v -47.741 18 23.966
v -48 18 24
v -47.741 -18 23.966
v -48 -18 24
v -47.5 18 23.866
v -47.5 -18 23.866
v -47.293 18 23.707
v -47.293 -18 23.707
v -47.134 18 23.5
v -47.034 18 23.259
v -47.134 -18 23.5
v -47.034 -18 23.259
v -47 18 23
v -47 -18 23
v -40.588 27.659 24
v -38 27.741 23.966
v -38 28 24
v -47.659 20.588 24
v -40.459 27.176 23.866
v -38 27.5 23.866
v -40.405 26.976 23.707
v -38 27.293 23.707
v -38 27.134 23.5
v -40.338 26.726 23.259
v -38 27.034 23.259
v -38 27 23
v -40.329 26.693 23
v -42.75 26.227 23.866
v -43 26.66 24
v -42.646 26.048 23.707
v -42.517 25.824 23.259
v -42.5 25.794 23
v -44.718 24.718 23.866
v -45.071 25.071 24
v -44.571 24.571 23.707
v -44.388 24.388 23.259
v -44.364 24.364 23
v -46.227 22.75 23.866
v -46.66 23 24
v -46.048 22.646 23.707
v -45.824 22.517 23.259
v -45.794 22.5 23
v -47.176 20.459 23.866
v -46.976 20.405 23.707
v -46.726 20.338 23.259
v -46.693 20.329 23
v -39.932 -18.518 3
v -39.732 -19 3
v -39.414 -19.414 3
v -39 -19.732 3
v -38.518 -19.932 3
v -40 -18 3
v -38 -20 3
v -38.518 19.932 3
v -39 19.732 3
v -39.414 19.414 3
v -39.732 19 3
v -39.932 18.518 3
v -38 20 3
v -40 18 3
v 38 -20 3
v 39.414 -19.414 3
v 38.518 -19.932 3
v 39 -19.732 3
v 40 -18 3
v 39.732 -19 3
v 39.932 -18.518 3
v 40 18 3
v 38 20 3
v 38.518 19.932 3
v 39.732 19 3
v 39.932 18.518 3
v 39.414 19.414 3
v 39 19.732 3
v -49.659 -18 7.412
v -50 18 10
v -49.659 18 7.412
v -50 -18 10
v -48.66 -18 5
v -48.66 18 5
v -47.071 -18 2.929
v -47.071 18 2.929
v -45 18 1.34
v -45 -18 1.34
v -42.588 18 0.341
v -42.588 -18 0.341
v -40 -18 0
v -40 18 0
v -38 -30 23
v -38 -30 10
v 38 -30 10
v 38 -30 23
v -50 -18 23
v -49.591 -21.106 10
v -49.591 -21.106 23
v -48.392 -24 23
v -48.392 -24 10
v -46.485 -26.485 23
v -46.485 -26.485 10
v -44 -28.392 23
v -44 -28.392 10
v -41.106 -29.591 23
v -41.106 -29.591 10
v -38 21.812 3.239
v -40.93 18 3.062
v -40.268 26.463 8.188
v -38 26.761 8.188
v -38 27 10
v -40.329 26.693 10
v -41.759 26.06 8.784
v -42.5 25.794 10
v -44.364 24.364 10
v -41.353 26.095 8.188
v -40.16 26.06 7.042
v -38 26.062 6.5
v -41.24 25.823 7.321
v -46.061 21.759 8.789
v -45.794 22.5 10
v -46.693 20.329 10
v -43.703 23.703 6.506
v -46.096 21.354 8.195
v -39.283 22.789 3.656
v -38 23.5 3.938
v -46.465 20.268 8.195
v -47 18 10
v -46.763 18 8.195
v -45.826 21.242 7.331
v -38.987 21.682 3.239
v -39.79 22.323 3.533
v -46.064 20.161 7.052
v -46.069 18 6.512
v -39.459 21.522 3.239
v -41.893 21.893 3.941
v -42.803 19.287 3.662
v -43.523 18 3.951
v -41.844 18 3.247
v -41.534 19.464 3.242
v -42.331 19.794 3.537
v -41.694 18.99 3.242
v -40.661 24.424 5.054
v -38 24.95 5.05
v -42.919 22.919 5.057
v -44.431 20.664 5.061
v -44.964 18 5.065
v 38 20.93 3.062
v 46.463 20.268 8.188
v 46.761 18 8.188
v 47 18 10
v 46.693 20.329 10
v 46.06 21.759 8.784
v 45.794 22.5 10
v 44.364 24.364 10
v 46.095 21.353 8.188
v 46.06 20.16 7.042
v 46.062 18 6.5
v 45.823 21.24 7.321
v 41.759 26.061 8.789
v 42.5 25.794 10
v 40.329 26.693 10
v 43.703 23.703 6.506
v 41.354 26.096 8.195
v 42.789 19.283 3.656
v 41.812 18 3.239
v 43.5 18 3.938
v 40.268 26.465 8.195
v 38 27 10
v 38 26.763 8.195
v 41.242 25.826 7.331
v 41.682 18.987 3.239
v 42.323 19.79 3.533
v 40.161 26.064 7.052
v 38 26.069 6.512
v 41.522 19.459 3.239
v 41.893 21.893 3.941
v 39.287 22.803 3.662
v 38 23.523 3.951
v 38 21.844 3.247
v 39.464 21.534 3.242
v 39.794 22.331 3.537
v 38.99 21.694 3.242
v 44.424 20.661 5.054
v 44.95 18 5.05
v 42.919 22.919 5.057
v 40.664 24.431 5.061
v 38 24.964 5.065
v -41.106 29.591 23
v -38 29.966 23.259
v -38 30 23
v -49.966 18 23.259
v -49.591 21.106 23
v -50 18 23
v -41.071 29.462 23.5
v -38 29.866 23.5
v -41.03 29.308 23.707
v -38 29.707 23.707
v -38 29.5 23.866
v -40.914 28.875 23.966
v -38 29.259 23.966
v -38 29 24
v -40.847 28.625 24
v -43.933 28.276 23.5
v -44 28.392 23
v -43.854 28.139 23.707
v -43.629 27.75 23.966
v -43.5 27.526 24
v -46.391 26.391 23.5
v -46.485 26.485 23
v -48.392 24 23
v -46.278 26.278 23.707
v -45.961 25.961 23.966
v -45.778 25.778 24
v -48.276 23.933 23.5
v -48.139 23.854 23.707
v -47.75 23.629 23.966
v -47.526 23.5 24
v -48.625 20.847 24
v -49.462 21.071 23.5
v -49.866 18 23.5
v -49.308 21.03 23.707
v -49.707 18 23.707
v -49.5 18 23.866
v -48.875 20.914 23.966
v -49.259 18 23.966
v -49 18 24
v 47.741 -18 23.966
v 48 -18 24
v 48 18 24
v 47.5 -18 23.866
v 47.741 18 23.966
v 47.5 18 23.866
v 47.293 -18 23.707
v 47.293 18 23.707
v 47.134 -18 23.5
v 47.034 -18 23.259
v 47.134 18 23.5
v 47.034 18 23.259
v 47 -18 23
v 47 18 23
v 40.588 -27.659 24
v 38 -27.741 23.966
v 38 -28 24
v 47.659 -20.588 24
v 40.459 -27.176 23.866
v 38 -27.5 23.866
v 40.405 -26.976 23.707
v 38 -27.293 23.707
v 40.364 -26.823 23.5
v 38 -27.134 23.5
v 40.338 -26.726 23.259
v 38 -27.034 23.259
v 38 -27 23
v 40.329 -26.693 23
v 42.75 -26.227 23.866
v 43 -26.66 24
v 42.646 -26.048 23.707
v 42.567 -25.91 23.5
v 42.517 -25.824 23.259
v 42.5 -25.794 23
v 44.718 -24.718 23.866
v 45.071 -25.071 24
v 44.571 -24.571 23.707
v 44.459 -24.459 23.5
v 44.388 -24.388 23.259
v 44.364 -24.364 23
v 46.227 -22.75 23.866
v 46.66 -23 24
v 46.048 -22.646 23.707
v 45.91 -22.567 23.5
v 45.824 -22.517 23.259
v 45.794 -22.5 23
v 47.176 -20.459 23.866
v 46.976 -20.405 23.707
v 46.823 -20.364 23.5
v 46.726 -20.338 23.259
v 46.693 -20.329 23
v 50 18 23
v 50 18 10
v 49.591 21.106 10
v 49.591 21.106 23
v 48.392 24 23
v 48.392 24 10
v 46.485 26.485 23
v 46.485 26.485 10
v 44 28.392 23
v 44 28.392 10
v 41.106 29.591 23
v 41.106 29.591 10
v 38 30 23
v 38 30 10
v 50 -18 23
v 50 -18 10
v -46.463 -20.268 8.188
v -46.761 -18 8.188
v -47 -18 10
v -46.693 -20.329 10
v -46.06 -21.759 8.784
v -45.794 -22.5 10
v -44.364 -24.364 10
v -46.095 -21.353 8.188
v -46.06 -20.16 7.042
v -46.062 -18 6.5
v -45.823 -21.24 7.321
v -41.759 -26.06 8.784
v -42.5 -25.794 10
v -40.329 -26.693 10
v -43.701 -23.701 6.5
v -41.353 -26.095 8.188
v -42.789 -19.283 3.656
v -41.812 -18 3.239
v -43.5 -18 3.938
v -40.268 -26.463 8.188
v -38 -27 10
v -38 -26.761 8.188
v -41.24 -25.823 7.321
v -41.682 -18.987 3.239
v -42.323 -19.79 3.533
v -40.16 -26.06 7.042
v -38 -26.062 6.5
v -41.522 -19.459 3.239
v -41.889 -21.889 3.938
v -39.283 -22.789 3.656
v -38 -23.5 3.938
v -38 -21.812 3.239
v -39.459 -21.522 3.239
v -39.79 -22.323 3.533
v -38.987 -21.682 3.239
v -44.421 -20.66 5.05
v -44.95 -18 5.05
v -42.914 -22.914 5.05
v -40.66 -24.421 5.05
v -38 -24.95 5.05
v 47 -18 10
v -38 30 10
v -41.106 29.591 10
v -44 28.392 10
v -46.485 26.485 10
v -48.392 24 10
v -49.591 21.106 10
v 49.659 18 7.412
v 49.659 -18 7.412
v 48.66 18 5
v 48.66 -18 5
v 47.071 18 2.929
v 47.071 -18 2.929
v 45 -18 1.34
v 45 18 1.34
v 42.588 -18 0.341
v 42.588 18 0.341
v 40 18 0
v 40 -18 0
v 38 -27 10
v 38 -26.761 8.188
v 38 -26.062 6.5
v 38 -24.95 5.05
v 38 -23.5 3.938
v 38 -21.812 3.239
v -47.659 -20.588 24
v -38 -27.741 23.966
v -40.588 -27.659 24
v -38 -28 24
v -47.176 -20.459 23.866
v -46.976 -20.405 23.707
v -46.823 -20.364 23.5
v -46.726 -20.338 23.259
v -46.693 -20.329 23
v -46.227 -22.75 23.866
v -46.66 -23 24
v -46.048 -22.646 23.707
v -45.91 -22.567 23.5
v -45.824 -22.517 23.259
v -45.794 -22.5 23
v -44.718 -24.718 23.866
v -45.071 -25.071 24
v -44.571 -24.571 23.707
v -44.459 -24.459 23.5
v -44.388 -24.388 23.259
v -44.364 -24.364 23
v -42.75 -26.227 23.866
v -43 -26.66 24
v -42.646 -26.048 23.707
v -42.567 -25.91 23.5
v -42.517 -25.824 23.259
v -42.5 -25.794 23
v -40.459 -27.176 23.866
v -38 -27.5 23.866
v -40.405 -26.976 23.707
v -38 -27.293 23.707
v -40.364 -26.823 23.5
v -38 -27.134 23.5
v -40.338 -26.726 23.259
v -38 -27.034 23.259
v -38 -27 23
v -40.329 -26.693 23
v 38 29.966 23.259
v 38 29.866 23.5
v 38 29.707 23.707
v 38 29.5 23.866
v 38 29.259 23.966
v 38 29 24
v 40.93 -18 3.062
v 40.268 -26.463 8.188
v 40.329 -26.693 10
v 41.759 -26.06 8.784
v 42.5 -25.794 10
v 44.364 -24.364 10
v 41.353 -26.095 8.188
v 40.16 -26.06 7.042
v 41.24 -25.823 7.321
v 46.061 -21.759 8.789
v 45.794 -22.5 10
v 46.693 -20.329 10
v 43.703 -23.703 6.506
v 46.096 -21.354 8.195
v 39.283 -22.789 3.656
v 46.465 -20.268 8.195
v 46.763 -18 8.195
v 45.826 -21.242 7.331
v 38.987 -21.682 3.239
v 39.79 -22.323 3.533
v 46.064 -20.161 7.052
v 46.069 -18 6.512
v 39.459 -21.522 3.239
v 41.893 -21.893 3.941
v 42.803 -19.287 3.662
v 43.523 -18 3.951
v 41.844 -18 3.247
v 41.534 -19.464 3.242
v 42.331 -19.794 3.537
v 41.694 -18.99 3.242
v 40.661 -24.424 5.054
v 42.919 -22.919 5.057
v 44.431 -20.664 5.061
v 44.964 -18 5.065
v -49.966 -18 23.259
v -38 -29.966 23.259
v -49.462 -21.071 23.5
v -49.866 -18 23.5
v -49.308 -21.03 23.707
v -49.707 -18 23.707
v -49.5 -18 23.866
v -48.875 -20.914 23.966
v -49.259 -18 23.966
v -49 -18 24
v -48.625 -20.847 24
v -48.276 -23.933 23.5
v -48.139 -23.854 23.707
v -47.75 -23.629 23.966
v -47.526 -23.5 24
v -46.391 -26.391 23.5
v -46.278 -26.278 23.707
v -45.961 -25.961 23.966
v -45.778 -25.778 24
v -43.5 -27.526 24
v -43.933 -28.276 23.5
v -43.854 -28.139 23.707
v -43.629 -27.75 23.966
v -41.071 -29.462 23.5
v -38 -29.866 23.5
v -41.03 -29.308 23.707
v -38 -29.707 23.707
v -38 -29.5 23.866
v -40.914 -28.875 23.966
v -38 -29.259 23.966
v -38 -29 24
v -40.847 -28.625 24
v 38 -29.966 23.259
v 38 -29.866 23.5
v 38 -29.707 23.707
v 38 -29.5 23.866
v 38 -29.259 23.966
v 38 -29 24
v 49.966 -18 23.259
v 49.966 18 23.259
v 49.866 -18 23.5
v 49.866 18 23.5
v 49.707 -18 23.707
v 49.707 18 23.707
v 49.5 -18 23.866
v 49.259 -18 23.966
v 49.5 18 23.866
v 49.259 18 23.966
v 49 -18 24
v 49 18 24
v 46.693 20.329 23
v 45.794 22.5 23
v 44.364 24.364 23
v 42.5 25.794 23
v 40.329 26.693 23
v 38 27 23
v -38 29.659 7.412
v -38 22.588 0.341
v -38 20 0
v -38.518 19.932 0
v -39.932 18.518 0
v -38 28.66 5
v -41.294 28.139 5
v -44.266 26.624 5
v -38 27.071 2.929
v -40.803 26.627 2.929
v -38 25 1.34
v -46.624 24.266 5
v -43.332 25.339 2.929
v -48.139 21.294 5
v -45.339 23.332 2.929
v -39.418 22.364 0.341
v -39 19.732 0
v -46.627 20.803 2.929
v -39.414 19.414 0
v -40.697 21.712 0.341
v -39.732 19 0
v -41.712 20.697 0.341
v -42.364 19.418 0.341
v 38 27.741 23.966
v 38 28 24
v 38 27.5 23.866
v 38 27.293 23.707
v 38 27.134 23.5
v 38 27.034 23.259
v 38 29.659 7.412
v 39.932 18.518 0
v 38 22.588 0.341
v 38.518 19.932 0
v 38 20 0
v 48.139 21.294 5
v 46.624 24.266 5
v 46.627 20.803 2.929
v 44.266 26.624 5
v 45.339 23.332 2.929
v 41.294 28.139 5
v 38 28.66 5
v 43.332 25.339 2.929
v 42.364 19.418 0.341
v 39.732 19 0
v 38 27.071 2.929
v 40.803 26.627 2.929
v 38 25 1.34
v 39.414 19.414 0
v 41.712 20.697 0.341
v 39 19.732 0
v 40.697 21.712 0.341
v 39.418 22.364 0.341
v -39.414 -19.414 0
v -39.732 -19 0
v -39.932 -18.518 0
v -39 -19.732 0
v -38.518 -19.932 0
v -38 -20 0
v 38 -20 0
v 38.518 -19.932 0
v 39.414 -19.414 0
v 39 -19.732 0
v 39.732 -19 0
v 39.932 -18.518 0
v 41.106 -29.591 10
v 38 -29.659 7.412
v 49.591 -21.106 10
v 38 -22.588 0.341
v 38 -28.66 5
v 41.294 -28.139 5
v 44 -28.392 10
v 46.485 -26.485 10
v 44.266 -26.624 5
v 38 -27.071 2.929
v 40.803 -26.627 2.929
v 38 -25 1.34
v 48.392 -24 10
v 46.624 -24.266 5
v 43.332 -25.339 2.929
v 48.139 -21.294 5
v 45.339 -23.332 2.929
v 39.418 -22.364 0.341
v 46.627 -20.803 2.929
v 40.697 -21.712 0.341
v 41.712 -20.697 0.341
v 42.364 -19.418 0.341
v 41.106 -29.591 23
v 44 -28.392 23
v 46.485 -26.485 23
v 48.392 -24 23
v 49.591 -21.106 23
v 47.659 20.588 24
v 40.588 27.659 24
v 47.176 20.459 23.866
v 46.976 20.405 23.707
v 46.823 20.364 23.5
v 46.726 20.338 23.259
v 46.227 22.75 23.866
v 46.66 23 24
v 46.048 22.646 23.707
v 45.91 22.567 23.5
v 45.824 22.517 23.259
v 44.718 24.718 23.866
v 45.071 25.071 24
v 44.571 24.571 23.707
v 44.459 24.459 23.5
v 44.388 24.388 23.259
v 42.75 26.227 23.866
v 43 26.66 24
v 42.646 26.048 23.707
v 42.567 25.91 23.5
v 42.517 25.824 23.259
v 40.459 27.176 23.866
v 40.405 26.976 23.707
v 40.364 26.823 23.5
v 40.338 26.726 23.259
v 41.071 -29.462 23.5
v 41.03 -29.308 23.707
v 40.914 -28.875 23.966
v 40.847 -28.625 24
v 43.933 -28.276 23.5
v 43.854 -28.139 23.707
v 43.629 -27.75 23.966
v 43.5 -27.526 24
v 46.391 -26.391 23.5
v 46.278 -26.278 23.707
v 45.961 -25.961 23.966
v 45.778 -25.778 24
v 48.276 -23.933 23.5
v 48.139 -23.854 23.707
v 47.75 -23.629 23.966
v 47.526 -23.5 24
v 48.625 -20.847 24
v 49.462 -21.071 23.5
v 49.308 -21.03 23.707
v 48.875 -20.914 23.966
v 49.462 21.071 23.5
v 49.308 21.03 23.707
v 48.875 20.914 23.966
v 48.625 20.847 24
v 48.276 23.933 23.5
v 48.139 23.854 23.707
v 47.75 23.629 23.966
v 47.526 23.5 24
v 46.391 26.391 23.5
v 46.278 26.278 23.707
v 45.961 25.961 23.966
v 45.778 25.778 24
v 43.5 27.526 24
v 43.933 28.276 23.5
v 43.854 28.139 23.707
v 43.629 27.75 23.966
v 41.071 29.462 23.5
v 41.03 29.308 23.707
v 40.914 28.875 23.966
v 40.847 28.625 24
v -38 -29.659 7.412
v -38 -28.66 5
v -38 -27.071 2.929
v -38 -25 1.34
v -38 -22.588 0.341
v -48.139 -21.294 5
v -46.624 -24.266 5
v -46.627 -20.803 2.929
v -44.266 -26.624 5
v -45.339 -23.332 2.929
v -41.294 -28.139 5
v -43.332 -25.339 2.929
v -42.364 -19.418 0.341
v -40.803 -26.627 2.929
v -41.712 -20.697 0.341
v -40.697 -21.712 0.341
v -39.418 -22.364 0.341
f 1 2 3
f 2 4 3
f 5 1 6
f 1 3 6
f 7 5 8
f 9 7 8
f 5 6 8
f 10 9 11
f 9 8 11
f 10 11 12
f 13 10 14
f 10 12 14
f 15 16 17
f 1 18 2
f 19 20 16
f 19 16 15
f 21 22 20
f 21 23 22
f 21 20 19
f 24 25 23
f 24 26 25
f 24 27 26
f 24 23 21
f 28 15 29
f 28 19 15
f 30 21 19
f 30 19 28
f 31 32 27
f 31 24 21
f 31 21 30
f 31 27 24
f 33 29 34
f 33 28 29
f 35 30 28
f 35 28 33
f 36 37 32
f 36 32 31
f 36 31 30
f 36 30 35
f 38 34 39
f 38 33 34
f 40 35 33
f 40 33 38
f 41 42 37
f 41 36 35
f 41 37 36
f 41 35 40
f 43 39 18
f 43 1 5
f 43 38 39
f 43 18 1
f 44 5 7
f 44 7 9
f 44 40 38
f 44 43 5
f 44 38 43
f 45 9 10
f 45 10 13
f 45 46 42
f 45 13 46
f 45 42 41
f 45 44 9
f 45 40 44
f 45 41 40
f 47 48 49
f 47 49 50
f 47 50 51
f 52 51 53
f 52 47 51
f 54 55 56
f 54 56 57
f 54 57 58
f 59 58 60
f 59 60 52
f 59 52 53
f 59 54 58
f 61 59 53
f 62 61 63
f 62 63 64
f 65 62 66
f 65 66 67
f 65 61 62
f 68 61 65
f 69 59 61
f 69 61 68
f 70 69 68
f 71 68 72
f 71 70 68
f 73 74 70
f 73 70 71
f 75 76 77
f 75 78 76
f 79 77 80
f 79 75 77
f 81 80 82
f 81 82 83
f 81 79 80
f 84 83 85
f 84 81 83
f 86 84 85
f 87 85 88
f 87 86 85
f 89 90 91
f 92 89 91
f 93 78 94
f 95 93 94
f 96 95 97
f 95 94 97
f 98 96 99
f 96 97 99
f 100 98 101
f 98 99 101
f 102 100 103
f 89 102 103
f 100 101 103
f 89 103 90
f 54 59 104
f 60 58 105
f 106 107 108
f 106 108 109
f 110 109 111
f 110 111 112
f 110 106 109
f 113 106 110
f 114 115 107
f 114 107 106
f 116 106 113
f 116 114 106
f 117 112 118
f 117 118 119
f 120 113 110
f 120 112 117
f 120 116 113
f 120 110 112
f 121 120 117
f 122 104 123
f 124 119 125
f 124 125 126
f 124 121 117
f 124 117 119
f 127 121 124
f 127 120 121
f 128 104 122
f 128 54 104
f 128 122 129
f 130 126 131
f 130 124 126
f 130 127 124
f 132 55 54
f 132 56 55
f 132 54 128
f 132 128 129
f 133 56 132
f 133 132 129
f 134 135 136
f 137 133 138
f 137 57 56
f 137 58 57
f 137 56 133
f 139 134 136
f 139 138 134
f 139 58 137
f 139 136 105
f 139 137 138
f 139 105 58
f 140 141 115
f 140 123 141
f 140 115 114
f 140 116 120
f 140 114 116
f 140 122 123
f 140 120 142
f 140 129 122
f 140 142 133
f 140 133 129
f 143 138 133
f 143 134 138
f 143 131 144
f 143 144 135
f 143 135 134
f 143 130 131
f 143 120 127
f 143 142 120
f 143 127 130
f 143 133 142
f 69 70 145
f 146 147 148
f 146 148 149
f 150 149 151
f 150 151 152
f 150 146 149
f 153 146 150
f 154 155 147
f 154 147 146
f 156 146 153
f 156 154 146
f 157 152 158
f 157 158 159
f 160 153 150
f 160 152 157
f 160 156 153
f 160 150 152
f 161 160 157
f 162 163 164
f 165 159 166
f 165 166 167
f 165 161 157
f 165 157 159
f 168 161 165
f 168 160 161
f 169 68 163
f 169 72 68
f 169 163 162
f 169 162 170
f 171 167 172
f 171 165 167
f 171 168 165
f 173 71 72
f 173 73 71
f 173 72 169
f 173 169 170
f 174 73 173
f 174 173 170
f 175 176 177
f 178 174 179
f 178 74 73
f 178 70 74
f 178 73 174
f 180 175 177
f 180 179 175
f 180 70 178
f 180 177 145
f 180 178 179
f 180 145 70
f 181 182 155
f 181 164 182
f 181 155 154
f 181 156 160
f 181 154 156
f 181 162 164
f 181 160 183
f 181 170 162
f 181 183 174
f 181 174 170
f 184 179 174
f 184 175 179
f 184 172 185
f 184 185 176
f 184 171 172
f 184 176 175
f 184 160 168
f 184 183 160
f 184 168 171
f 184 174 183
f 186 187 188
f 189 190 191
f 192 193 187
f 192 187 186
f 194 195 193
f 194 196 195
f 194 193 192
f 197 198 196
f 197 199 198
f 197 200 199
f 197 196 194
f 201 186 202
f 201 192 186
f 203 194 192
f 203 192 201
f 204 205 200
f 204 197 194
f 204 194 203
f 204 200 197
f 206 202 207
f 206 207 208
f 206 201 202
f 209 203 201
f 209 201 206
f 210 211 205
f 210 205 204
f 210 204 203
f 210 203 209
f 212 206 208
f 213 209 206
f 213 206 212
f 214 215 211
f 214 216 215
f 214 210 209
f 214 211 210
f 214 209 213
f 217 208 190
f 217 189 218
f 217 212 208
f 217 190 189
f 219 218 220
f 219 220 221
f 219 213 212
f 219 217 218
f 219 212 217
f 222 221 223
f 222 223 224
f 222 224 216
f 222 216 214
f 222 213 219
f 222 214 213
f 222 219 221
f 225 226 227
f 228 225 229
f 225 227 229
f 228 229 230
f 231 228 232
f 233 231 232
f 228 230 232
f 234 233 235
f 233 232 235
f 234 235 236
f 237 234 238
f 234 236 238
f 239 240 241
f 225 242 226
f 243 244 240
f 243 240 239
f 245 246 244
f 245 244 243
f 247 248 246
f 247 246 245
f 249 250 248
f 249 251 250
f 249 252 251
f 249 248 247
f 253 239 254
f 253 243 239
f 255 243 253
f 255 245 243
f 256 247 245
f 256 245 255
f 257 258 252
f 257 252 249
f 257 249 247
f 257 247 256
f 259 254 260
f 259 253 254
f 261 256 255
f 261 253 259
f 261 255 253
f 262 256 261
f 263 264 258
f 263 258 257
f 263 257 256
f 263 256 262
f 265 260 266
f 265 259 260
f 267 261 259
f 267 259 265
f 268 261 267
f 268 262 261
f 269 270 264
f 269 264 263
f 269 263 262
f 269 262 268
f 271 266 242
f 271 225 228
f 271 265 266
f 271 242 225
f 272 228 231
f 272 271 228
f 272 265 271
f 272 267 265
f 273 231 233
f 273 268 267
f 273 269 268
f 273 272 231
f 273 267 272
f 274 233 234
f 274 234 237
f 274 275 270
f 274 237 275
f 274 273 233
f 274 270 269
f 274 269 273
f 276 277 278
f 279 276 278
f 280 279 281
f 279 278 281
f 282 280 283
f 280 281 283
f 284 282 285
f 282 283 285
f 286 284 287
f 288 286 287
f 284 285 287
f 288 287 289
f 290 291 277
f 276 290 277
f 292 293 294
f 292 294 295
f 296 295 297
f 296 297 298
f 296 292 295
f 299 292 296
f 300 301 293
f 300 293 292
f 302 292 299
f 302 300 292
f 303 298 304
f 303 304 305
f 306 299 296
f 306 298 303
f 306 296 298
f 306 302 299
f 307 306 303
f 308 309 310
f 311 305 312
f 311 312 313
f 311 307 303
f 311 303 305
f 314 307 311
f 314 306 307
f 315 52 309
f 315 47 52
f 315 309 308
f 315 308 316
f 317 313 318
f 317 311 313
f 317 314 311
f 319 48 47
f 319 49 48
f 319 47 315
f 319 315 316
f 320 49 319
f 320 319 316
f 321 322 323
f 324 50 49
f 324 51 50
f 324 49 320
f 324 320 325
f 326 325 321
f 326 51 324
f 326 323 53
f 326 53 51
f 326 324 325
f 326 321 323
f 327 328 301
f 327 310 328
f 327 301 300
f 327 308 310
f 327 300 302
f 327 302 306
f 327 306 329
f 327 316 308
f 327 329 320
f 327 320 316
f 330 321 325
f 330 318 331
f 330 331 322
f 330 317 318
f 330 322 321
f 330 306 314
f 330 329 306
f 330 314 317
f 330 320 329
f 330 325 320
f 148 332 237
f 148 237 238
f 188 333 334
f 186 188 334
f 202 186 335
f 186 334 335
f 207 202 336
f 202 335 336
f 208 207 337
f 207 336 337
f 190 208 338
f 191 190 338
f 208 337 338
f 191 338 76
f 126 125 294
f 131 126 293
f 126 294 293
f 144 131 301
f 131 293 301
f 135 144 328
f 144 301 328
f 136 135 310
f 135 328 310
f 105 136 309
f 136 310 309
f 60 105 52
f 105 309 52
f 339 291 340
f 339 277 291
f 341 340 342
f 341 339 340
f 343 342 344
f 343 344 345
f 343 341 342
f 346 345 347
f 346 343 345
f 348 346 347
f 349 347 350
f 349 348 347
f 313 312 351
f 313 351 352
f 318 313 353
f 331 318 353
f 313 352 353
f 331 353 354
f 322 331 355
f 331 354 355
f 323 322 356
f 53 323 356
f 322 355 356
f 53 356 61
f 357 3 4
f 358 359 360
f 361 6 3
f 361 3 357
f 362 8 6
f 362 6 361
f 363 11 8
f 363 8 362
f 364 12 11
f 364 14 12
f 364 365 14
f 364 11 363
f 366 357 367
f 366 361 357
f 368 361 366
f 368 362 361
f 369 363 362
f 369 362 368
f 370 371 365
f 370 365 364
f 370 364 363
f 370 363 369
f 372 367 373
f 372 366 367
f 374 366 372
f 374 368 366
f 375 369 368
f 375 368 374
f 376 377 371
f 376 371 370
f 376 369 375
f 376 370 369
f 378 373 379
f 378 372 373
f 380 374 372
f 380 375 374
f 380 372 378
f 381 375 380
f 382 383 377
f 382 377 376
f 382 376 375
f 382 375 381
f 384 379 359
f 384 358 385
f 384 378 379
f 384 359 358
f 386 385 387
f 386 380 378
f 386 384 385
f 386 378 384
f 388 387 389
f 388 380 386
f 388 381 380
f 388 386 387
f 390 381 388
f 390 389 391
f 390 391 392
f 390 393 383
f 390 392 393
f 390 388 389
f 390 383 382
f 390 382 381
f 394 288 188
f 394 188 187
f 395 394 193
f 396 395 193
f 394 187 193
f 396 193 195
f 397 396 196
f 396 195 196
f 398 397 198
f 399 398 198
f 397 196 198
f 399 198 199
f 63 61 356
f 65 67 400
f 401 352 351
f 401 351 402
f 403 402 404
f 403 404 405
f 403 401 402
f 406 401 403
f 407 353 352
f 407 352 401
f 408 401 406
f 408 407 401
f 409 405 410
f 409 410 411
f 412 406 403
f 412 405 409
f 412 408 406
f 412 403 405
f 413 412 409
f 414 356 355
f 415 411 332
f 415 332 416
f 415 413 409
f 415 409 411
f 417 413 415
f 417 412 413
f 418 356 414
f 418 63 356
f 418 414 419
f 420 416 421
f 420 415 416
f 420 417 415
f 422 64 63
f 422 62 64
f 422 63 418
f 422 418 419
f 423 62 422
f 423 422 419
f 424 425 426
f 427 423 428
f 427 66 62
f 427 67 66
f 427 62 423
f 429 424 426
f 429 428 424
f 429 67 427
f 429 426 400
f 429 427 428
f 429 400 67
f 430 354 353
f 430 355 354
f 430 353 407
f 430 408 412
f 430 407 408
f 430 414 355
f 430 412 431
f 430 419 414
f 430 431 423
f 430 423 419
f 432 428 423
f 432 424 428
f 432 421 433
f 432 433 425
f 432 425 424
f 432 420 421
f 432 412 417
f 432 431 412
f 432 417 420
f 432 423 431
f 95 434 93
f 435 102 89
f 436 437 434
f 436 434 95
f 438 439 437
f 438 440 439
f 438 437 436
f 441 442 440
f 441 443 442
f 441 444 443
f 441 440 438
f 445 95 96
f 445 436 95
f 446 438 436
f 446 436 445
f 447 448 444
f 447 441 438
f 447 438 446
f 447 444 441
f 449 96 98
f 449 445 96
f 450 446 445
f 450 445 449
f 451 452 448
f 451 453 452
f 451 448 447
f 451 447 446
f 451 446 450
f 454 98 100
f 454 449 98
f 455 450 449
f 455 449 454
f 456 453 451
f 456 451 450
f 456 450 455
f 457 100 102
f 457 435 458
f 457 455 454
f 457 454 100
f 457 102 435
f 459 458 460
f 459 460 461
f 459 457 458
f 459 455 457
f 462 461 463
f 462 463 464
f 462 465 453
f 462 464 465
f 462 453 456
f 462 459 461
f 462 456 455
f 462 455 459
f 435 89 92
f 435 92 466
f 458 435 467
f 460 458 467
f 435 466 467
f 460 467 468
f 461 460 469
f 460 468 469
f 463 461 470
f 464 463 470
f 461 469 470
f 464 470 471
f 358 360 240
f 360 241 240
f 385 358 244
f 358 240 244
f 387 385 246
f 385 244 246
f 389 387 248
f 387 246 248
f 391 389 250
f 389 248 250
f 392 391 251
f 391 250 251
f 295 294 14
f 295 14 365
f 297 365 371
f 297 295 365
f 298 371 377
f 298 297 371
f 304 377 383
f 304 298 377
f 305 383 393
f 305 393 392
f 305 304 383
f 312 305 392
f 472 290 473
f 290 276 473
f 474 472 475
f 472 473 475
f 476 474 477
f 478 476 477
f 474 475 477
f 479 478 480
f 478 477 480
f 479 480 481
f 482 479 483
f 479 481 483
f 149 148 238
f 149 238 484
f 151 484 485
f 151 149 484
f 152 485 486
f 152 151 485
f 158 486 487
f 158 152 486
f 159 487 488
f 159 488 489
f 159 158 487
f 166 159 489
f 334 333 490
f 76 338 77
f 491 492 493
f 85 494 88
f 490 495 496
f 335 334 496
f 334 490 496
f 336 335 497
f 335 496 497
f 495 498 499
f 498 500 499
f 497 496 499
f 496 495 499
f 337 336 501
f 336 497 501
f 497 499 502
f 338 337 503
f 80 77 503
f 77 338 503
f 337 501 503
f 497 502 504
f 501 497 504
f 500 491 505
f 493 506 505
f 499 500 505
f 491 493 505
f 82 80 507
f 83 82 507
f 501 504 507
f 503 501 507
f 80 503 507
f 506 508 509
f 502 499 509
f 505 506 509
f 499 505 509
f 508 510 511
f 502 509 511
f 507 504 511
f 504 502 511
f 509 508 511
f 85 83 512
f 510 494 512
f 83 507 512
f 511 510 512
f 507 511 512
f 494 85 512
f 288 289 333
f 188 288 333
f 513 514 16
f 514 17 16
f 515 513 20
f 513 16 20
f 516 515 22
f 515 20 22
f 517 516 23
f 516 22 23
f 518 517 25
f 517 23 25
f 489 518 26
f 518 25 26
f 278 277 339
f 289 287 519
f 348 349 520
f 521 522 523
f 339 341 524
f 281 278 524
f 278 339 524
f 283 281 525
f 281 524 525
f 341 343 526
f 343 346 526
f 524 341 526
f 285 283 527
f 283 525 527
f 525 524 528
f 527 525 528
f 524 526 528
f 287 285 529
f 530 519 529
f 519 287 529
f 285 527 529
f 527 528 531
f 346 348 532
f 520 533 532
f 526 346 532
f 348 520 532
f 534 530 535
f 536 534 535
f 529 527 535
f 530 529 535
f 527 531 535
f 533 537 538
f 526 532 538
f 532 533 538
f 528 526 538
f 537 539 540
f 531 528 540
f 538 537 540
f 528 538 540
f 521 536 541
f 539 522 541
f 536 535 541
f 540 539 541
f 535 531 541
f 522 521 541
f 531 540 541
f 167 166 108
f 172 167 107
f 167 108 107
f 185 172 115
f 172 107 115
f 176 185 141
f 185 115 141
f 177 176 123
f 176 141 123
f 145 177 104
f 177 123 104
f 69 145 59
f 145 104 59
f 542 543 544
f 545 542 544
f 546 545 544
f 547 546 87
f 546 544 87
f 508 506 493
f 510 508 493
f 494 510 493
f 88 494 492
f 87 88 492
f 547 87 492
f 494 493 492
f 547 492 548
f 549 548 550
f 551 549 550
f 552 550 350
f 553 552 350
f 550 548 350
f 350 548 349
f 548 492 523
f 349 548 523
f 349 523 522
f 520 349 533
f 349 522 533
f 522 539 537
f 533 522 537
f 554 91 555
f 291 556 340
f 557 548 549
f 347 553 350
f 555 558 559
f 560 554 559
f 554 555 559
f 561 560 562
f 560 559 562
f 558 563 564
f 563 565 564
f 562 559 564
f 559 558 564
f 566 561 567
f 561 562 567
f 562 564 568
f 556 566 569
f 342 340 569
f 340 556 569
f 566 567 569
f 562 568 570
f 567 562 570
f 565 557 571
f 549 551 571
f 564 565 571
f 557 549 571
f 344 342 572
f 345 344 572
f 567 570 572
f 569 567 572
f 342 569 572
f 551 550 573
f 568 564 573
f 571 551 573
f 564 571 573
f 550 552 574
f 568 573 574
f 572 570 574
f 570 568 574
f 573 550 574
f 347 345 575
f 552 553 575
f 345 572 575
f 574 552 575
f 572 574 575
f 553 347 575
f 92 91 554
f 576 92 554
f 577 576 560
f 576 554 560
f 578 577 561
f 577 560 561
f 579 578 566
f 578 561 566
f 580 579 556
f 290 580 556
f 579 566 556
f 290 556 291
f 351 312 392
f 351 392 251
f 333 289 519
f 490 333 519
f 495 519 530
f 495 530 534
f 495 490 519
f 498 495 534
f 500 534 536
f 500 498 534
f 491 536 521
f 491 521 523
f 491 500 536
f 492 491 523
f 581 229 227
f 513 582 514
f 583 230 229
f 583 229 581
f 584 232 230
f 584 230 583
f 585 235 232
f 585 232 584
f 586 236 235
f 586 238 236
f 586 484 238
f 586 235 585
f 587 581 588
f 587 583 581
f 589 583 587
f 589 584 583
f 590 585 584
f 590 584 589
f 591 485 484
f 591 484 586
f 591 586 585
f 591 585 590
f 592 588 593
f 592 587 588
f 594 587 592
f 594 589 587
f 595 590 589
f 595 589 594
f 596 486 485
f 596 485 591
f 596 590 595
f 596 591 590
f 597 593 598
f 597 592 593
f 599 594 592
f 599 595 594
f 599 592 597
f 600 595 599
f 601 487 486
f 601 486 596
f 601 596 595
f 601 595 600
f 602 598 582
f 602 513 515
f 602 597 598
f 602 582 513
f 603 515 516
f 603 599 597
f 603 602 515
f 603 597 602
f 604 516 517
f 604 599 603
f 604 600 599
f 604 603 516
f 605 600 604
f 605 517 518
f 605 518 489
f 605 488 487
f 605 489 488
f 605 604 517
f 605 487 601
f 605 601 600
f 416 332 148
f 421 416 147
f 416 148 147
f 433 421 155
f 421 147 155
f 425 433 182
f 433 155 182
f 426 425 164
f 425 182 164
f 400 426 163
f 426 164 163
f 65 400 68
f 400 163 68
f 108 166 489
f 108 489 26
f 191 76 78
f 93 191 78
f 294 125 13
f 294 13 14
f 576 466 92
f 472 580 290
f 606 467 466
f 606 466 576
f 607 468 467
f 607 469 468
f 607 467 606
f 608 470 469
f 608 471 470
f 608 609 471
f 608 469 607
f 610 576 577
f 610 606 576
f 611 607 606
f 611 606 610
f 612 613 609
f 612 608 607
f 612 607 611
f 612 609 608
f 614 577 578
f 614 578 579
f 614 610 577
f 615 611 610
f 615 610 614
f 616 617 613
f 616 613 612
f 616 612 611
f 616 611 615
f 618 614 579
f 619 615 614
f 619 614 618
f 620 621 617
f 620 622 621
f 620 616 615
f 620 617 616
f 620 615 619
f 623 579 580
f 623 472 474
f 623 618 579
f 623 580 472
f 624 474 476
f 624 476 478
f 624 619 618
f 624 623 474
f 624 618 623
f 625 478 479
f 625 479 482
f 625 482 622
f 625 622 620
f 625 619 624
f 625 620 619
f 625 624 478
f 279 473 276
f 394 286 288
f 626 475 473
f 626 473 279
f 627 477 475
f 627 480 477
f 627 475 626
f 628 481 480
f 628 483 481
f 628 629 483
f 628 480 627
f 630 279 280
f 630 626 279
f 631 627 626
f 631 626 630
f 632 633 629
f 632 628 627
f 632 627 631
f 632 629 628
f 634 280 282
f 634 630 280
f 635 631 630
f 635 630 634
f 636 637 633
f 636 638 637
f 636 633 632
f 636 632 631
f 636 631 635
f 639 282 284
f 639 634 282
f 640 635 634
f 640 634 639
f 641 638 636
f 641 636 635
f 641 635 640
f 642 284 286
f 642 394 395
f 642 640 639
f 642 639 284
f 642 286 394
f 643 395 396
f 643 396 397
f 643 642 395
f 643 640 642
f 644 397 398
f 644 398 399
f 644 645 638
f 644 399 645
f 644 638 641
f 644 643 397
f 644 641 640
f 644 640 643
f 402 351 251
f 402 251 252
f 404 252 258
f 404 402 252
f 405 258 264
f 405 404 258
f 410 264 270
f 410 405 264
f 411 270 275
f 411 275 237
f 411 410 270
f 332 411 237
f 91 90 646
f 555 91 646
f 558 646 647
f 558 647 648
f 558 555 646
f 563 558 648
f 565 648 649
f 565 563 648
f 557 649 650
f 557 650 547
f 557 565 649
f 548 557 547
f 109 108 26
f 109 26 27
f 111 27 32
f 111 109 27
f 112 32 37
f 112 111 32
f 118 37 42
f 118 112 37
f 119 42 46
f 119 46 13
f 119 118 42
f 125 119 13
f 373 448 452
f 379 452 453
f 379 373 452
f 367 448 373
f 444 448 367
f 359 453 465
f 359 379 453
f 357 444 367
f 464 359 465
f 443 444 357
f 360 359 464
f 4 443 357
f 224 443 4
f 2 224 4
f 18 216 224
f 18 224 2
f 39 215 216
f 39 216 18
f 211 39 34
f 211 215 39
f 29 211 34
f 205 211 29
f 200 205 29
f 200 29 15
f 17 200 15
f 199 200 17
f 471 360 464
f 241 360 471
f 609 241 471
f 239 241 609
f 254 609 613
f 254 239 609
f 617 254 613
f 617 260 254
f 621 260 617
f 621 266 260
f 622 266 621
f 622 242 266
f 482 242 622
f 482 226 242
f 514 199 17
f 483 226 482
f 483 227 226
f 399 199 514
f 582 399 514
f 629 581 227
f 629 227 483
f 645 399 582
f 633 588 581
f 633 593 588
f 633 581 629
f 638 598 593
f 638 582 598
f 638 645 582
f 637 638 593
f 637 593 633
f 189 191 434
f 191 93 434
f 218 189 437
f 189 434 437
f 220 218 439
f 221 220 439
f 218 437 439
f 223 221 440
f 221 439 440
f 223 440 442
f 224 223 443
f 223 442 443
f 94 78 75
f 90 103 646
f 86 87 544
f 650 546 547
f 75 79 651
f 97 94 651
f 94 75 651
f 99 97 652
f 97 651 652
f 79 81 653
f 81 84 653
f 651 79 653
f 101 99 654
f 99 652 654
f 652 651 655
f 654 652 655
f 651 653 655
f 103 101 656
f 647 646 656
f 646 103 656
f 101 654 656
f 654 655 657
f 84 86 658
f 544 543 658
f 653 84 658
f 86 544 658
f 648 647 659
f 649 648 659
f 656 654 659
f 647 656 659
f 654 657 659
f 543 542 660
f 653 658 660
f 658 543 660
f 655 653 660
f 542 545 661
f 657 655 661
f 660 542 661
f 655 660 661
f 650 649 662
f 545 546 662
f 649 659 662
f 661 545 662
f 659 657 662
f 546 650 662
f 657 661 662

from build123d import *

# Parameters (mm, degrees)
PAD_DEPTH   = 24
FILLET_R    = 10
THICKNESS_T = -3
FILLET001_R = 1


with BuildPart() as part:
    # Sketch (on XY_Plane of Origin) → Pad (new body)
    with BuildSketch(Plane.XY):
        with BuildLine():
            Line((-38, -30), (38, -30))
            ThreePointArc((38, -30), (46.485281, -26.485281), (50, -18))
            Line((50, -18), (50, 18))
            ThreePointArc((50, 18), (46.485281, 26.485281), (38, 30))
            Line((38, 30), (-38, 30))
            ThreePointArc((-38, 30), (-46.485281, 26.485281), (-50, 18))
            Line((-50, 18), (-50, -18))
            ThreePointArc((-50, -18), (-46.485281, -26.485281), (-38, -30))
        make_face()
    extrude(amount=PAD_DEPTH)

    # Fillet
    fillet_edges = [part.edges().sort_by_distance(p)[0] for p in [
        (0, -30, 0),
    ]]
    fillet(fillet_edges, radius=FILLET_R)

    # Thickness
    thickness_openings = [part.faces().sort_by_distance(p)[0] for p in [
        (0, 0, 24),
    ]]
    offset(amount=THICKNESS_T, openings=thickness_openings)

    # Fillet001
    fillet001_edges = [part.edges().sort_by_distance(p)[0] for p in [
        (0, -30, 24),
        (-47, 0, 24),
    ]]
    fillet(fillet001_edges, radius=FILLET001_R)


solid = part.part
